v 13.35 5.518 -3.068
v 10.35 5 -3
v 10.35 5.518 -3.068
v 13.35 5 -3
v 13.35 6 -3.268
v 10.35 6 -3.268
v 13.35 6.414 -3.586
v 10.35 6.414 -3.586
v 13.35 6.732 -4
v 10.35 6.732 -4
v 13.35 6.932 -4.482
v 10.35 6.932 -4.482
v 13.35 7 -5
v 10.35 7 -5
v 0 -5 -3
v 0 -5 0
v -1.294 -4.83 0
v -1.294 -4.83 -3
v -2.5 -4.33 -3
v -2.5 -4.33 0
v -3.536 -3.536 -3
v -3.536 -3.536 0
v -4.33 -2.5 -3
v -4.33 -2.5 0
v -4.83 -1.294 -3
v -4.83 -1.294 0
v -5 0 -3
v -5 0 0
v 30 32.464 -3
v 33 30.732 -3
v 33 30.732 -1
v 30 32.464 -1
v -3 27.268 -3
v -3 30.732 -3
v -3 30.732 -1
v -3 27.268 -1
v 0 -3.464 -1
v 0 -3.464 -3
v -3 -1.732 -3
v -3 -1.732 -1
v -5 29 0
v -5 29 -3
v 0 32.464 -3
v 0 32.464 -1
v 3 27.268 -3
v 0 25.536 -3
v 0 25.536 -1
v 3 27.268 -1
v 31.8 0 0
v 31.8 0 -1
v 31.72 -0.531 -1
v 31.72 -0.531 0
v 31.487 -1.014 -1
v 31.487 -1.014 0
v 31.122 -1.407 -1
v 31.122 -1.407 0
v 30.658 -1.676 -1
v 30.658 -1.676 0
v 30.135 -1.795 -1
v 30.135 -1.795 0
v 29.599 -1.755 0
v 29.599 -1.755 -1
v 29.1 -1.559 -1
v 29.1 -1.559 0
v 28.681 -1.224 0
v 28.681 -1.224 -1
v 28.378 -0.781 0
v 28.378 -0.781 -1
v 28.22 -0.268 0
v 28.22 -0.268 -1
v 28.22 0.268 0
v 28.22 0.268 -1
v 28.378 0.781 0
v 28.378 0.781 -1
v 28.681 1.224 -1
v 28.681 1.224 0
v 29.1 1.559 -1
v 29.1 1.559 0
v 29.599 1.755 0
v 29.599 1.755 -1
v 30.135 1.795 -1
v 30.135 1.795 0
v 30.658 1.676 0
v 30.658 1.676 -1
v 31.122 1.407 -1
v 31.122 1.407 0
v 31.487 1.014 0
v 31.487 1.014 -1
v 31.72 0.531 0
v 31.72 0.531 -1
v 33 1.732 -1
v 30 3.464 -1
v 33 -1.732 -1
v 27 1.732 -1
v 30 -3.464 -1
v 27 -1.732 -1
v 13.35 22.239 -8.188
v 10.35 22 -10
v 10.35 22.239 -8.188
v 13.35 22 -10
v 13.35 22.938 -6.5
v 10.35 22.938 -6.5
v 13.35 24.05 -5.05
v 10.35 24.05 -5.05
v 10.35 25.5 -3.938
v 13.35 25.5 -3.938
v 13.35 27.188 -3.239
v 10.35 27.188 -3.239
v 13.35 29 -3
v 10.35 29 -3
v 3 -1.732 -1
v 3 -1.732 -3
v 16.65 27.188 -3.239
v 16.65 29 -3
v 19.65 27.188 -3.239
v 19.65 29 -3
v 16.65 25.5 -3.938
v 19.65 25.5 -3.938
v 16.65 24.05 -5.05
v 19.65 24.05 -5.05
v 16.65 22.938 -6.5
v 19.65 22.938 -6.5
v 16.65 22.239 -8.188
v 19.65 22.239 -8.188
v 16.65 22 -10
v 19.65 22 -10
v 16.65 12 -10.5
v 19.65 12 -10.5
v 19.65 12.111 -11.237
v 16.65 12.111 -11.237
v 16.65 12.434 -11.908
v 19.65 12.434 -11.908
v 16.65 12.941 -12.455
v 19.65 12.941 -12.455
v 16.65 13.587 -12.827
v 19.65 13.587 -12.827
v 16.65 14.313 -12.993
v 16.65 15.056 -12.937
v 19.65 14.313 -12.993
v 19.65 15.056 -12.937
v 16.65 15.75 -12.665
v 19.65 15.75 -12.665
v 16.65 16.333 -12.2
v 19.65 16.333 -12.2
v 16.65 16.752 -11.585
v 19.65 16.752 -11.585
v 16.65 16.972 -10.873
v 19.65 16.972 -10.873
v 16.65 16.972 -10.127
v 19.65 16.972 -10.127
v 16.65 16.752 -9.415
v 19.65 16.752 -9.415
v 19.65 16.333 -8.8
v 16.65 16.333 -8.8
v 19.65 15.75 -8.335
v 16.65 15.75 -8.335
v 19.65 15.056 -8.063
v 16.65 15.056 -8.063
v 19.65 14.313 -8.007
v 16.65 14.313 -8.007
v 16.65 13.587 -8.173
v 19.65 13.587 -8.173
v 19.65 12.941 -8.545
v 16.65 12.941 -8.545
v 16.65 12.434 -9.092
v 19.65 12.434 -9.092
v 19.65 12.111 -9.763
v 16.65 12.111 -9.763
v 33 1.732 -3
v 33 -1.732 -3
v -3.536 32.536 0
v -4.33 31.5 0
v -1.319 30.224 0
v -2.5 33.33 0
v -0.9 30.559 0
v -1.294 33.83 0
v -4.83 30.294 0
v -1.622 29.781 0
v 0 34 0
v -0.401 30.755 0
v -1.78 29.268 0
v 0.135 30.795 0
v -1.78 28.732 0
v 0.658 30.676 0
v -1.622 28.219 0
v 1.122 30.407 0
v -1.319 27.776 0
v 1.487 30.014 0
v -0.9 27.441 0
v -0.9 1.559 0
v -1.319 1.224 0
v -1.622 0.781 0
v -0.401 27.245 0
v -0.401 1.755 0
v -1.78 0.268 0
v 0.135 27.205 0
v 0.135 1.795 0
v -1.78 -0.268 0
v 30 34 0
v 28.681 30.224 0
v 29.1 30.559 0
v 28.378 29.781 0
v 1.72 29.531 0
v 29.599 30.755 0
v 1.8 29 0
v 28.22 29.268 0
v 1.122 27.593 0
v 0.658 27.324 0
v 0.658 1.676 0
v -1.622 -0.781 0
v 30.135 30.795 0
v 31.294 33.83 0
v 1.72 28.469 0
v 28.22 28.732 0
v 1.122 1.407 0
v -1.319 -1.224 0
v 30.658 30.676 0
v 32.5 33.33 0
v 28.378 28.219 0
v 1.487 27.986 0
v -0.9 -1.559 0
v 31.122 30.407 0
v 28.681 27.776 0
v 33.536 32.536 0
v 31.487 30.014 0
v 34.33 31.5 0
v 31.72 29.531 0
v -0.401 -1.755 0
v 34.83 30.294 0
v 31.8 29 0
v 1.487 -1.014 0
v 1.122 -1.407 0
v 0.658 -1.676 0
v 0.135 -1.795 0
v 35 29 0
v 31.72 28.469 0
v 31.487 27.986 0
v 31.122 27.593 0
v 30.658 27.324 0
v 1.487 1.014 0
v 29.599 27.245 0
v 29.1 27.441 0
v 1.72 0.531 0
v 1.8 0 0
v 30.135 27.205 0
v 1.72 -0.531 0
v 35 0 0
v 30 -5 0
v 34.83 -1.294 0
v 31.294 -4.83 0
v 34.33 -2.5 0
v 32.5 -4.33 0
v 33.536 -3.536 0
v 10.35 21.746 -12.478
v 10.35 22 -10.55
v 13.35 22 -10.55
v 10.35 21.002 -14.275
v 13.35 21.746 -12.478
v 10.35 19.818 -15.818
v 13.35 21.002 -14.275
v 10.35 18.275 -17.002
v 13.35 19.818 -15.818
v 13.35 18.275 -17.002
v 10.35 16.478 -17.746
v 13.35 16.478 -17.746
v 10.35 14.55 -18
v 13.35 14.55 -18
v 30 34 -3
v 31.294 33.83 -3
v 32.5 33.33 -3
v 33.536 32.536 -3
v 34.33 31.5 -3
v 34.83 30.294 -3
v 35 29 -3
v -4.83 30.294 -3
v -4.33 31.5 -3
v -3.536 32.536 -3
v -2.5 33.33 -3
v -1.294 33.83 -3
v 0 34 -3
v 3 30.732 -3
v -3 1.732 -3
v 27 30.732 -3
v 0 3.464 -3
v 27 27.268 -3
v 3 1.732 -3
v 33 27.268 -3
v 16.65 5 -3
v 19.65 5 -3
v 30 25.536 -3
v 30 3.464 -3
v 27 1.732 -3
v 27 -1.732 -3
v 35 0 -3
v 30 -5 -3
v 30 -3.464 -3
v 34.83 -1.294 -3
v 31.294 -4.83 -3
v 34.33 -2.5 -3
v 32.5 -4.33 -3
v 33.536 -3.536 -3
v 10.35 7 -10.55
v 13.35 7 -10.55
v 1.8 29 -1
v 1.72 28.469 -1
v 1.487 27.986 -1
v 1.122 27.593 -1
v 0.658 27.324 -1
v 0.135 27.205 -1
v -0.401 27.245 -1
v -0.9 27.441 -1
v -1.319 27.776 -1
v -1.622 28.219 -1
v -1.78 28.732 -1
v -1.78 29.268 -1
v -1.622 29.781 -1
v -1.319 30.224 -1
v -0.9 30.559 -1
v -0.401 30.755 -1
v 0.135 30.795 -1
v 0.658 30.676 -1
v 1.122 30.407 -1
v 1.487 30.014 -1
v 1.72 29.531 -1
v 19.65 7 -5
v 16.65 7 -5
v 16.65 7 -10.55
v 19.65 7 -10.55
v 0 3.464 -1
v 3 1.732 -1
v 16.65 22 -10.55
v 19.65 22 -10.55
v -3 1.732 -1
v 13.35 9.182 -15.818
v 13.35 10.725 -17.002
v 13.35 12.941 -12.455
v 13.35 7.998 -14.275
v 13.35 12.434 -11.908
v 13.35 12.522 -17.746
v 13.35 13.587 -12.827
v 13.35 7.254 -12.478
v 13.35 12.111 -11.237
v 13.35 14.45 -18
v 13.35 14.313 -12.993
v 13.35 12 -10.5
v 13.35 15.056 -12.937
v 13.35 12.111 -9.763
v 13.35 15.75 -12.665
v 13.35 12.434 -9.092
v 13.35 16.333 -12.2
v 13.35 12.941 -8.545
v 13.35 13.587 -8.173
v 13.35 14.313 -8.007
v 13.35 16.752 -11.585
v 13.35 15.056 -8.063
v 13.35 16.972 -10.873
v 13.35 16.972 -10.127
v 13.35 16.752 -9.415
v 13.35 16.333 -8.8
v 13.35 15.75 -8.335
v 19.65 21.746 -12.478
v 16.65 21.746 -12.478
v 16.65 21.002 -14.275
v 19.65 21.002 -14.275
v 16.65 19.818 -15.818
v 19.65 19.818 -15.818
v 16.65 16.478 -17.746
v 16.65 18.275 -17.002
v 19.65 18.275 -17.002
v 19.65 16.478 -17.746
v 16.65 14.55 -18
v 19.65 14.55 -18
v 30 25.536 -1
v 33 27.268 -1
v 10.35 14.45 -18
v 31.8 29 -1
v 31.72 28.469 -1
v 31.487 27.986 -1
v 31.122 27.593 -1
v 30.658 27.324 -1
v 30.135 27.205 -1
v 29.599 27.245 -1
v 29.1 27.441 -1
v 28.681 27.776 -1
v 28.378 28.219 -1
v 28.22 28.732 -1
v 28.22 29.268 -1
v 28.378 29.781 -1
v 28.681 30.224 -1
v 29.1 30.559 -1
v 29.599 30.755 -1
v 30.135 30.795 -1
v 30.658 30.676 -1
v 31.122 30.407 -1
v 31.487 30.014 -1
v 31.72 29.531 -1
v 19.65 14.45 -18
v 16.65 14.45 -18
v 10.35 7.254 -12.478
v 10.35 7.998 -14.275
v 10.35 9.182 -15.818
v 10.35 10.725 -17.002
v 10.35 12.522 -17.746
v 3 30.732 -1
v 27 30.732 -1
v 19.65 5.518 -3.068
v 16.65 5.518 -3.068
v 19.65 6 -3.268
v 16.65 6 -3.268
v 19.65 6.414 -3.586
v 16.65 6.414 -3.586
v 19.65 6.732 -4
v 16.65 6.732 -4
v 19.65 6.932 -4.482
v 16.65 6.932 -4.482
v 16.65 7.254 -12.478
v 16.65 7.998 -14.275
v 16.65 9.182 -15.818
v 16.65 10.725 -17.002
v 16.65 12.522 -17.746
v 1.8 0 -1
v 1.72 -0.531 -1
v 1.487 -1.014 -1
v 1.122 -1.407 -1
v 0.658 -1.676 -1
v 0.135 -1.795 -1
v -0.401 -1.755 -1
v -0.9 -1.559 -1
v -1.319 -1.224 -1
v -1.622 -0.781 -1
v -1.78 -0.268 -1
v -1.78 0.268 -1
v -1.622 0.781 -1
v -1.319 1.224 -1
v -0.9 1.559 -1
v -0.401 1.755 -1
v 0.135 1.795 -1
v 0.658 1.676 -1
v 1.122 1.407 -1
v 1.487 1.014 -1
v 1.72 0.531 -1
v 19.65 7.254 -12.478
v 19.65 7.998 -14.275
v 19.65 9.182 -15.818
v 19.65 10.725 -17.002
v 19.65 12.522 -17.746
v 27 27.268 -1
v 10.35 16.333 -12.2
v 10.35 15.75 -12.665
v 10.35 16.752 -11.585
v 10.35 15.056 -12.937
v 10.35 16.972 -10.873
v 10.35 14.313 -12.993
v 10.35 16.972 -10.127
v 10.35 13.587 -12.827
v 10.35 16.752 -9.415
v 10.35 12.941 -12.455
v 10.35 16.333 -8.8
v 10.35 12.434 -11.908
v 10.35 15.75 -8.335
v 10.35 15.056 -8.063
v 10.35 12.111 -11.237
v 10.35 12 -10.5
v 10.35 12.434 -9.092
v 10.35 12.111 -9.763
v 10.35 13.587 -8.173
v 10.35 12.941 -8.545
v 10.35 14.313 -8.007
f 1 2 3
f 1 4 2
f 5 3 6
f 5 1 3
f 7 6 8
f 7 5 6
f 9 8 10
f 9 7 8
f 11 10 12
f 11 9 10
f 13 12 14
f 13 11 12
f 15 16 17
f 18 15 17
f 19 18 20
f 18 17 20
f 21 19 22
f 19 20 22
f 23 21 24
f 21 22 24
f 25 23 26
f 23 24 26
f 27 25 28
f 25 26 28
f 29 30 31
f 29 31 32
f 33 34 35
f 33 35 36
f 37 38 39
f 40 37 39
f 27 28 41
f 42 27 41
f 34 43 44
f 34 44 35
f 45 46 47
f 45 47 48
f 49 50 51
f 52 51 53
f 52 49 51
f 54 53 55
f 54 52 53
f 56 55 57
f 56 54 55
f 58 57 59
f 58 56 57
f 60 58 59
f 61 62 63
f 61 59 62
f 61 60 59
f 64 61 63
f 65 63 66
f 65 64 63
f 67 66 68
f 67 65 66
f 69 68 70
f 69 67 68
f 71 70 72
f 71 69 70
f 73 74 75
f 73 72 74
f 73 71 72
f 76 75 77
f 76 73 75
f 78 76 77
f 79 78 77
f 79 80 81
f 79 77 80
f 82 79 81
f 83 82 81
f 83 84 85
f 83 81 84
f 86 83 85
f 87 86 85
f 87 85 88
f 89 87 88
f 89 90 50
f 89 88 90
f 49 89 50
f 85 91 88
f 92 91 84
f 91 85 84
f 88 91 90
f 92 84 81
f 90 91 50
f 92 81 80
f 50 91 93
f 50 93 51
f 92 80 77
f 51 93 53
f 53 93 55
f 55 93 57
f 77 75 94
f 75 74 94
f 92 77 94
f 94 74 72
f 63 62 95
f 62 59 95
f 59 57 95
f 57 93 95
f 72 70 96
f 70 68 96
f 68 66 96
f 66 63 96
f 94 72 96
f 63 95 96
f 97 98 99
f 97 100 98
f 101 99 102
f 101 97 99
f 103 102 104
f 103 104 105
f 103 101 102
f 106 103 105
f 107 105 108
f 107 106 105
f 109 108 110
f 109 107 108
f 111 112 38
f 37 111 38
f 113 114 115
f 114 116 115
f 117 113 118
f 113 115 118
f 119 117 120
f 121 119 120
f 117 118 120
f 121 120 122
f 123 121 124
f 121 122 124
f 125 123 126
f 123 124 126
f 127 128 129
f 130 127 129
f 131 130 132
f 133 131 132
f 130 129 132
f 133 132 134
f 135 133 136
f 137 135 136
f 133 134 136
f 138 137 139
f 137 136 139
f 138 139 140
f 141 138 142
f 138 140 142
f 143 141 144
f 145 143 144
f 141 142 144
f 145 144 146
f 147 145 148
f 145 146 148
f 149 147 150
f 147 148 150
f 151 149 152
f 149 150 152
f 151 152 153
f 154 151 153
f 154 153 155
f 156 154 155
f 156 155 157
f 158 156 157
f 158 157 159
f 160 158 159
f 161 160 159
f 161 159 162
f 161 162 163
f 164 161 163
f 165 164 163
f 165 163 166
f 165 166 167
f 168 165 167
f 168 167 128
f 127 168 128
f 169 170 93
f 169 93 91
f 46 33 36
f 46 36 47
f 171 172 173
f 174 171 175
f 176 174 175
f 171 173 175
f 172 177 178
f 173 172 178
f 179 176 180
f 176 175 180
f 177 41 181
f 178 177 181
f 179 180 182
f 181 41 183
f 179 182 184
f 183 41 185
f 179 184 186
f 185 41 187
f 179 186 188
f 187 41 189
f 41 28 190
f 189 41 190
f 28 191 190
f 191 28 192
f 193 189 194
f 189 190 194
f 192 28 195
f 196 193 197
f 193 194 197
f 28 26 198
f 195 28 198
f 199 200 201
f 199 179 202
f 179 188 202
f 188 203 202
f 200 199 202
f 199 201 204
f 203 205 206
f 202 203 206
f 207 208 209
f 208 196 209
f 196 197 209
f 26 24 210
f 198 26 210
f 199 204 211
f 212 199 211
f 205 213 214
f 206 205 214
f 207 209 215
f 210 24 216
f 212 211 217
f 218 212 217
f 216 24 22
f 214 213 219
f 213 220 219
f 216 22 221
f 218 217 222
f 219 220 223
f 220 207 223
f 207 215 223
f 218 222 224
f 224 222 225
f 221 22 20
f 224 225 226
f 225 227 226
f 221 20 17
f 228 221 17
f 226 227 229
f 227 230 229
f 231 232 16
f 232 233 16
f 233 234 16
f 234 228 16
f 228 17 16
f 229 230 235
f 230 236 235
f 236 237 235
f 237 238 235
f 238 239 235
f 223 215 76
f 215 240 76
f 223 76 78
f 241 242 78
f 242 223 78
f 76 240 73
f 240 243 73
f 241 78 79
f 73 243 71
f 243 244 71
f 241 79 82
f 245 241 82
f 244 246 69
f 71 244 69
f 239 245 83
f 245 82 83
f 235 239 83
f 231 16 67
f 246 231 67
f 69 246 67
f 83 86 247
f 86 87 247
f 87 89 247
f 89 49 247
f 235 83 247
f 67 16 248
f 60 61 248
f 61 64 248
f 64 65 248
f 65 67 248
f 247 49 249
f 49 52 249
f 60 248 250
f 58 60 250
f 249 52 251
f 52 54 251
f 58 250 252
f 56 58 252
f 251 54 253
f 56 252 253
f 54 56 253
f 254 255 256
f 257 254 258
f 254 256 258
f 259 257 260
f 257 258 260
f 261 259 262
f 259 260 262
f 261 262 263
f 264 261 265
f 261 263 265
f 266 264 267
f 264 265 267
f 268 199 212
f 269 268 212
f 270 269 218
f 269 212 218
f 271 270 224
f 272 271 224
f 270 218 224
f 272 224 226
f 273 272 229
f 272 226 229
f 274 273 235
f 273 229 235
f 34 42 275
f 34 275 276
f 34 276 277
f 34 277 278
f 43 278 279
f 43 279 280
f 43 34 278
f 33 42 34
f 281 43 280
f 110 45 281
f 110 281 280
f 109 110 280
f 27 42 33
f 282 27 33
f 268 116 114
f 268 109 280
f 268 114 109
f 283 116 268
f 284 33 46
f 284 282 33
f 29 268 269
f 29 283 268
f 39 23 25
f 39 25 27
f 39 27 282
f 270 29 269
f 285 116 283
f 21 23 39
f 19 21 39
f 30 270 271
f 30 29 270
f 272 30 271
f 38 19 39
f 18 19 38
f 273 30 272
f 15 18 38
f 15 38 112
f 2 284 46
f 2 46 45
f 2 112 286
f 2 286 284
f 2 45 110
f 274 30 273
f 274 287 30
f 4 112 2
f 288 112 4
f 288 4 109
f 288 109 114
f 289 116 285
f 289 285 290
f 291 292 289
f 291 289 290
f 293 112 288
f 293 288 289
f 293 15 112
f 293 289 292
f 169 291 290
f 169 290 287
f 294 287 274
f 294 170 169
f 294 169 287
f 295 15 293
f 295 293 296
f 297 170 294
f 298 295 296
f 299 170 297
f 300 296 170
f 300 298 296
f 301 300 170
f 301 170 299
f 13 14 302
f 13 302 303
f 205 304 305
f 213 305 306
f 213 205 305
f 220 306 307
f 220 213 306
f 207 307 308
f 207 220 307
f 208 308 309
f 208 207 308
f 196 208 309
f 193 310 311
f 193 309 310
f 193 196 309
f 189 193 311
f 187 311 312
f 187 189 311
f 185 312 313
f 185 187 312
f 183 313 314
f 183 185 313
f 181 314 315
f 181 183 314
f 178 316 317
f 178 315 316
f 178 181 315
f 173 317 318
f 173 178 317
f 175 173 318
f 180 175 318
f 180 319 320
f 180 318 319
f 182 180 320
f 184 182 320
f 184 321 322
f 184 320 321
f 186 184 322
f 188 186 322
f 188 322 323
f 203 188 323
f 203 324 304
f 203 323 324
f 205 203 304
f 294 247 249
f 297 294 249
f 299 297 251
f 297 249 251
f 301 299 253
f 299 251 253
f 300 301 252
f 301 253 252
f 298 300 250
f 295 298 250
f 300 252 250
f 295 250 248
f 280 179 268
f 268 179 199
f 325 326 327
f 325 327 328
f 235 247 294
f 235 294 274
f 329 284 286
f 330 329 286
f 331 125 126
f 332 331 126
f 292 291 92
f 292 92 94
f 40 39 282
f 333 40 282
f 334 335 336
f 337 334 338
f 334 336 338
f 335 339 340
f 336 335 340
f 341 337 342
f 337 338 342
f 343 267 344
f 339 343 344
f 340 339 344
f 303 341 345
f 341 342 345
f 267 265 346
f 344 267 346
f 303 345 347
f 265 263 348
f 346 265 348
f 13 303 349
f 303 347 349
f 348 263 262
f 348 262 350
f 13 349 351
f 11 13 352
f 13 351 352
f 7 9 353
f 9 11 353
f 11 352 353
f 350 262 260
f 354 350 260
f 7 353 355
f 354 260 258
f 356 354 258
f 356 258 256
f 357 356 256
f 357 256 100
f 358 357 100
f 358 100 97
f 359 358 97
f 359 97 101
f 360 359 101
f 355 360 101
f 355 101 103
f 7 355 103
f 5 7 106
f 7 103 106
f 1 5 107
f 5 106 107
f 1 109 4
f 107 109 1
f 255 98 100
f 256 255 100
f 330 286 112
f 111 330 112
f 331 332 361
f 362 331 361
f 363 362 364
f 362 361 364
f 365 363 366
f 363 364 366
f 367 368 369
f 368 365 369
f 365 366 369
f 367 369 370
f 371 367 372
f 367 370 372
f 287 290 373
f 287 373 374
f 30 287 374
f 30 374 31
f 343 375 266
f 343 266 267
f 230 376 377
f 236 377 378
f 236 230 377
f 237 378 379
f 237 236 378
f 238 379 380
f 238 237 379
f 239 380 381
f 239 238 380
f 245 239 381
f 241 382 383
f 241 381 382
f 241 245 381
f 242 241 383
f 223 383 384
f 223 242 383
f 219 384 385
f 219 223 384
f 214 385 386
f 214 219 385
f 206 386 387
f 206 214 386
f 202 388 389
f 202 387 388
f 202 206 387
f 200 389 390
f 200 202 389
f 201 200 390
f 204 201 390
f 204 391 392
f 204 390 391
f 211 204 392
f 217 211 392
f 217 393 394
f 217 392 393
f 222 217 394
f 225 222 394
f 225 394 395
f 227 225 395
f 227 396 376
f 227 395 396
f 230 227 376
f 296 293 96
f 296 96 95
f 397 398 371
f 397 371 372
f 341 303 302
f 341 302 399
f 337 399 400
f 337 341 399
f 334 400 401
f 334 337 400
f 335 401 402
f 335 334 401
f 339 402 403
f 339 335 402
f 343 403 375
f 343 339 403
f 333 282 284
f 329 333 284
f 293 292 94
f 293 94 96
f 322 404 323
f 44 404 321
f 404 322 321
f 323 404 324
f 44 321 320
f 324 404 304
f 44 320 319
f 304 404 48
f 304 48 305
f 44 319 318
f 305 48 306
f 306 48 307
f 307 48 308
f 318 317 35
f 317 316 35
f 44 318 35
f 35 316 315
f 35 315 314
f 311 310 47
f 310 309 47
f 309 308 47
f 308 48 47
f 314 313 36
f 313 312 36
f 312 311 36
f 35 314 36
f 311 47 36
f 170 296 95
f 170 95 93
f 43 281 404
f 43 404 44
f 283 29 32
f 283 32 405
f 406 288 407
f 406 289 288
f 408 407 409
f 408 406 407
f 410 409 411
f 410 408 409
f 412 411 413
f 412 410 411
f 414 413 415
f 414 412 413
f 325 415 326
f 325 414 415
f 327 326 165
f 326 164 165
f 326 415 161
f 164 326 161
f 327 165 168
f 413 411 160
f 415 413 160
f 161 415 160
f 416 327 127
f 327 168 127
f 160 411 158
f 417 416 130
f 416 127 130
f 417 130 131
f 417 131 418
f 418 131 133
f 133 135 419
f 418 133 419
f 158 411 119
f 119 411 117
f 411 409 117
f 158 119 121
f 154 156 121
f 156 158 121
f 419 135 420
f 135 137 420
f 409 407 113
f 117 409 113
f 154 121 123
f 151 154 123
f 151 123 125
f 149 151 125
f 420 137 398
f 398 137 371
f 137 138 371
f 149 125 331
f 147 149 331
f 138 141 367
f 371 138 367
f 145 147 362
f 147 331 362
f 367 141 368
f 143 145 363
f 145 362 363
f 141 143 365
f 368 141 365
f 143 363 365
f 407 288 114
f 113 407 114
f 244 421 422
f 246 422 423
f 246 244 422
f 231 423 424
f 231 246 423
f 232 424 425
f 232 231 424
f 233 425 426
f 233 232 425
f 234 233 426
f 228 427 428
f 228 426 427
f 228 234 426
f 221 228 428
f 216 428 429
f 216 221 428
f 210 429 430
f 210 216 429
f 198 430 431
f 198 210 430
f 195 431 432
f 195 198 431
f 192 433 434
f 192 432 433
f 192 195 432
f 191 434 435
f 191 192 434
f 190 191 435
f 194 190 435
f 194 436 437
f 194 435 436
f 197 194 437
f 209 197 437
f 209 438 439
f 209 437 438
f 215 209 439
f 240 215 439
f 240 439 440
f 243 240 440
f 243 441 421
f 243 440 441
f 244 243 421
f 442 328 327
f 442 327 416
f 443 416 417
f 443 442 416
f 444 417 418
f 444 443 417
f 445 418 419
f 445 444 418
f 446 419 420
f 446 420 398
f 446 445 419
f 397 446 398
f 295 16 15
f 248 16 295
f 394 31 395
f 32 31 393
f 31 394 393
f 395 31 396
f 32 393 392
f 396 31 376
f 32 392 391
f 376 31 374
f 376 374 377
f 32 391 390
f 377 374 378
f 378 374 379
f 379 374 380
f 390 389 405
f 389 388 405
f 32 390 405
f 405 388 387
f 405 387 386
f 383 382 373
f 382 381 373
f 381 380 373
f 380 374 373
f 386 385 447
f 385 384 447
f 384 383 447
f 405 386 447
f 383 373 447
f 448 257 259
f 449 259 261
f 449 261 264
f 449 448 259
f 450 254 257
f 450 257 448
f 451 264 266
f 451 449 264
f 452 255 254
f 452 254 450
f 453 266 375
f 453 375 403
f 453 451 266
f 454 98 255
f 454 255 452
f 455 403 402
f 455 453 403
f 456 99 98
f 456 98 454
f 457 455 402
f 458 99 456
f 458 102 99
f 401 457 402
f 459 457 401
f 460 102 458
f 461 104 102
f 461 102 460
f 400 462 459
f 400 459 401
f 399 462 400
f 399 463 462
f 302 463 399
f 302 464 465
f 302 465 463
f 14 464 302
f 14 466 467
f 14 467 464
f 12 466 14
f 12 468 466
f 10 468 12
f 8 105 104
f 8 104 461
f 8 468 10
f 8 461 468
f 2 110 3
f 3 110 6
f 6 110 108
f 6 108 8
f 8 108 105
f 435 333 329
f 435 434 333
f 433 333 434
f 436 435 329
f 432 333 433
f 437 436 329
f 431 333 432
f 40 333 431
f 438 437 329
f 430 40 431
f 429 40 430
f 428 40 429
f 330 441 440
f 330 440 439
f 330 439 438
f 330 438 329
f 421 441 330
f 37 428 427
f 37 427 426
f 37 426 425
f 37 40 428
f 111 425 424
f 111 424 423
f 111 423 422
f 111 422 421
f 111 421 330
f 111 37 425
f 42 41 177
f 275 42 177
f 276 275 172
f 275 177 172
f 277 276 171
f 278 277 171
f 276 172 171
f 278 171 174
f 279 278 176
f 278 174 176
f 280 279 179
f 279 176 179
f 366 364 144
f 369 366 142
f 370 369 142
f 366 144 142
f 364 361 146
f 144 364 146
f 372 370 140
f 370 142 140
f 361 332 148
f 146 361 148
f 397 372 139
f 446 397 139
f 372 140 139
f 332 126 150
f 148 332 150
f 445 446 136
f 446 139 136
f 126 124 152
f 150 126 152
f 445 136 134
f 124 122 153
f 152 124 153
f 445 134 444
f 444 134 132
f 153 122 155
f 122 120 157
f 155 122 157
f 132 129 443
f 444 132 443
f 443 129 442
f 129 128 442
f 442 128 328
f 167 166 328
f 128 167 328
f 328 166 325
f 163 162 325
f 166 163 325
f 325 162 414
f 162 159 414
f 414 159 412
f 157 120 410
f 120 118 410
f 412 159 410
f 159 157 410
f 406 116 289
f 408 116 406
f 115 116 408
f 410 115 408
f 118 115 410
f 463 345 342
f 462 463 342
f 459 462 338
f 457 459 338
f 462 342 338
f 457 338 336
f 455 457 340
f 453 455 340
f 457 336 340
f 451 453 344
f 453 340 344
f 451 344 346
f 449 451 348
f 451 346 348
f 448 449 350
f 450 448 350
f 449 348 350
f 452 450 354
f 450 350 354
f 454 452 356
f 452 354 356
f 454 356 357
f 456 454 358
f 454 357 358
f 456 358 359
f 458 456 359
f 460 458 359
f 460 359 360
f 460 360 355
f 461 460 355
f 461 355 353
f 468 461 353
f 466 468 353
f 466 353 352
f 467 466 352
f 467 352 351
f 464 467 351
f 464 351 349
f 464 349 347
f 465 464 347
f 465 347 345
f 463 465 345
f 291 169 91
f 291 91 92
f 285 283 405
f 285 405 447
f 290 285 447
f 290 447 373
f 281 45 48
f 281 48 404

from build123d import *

# Parameters (mm, degrees)
SKETCH_R        = 1.8
PAD_DEPTH       = 3
POCKET_DEPTH    = 2
SKETCH002_W     = 9.3
SKETCH002_H     = 15
PAD001_DEPTH    = 15
SKETCH003_R     = 2.5
POCKET001_DEPTH = 10
FILLET_R        = 7.45
POCKET002_DEPTH = 15
FILLET001_R     = 7
FILLET002_R     = 2


with BuildPart() as part:
    # Sketch → Pad (new body)
    with BuildSketch(Plane(origin=(0, 0, 0), x_dir=(1, 0, 0), z_dir=(0, 0, -1))):
        with BuildLine():
            ThreePointArc((0, 5), (-3.535534, 3.535534), (-5, 0))
            Line((-5, 0), (-5, -29))
            ThreePointArc((-5, -29), (-3.535534, -32.535534), (0, -34))
            Line((0, -34), (30, -34))
            ThreePointArc((30, -34), (33.535534, -32.535534), (35, -29))
            Line((35, 0), (35, -29))
            ThreePointArc((35, 0), (33.535534, 3.535534), (30, 5))
            Line((0, 5), (30, 5))
        make_face()
        Circle(SKETCH_R, mode=Mode.SUBTRACT)
        with Locations((30, 0)):
            Circle(SKETCH_R, mode=Mode.SUBTRACT)
        with Locations((30, -29)):
            Circle(SKETCH_R, mode=Mode.SUBTRACT)
        with Locations((0, -29)):
            Circle(SKETCH_R, mode=Mode.SUBTRACT)
    extrude(amount=PAD_DEPTH)

    # Sketch001 → Pocket (cut)
    with BuildSketch(Plane(origin=(0, 0, -3), x_dir=(1, 0, 0), z_dir=(0, 0, -1))):
        Polygon((-3, -30.732051), (-3, -27.267949), (0, -25.535898), (3, -27.267949), (3, -30.732051), (0, -32.464102), align=None)
        Polygon((27, -30.732051), (27, -27.267949), (30, -25.535898), (33, -27.267949), (33, -30.732051), (30, -32.464102), align=None)
        Polygon((-3, 1.732051), (-3, -1.732051), (0, -3.464102), (3, -1.732051), (3, 1.732051), (0, 3.464102), align=None)
        Polygon((27, -1.732051), (27, 1.732051), (30, 3.464102), (33, 1.732051), (33, -1.732051), (30, -3.464102), align=None)
    extrude(amount=-POCKET_DEPTH, mode=Mode.SUBTRACT)

    # Sketch002 → Pad001 (new body)
    with BuildSketch(Plane(origin=(0, 0, -3), x_dir=(1, 0, 0), z_dir=(0, 0, -1))):
        with Locations((15, -14.5)):
            Rectangle(SKETCH002_W, SKETCH002_H)
    extrude(amount=PAD001_DEPTH)

    # Sketch003 → Pocket001 (cut)
    with BuildSketch(Plane(origin=(19.65, 0, 0), x_dir=(0, -1, 0), z_dir=(1, 0, 0))):
        with Locations((-14.5, 10.5)):
            Circle(SKETCH003_R)
    extrude(amount=-POCKET001_DEPTH, mode=Mode.SUBTRACT)

    # Fillet
    fillet_edges = [part.edges().sort_by_distance(p)[0] for p in [
        (15, 22, -18),
        (15, 7, -18),
    ]]
    fillet(fillet_edges, radius=FILLET_R)

    # Sketch004 → Pocket002 (cut)
    with BuildSketch(Plane(origin=(0, 22, 0), x_dir=(1, 0, 0), z_dir=(0, 1, 0))):
        Polygon((13.35, 18), (13.35, 3), (16.65, 3), (16.65, 18), (15, 18), align=None)
    extrude(amount=-POCKET002_DEPTH, mode=Mode.SUBTRACT)

    # Fillet001
    fillet001_edges = [part.edges().sort_by_distance(p)[0] for p in [
        (18.15, 22, -3),
        (11.85, 22, -3),
    ]]
    fillet(fillet001_edges, radius=FILLET001_R)

    # Fillet002
    fillet002_edges = [part.edges().sort_by_distance(p)[0] for p in [
        (18.15, 7, -3),
        (11.85, 7, -3),
    ]]
    fillet(fillet002_edges, radius=FILLET002_R)


solid = part.part
